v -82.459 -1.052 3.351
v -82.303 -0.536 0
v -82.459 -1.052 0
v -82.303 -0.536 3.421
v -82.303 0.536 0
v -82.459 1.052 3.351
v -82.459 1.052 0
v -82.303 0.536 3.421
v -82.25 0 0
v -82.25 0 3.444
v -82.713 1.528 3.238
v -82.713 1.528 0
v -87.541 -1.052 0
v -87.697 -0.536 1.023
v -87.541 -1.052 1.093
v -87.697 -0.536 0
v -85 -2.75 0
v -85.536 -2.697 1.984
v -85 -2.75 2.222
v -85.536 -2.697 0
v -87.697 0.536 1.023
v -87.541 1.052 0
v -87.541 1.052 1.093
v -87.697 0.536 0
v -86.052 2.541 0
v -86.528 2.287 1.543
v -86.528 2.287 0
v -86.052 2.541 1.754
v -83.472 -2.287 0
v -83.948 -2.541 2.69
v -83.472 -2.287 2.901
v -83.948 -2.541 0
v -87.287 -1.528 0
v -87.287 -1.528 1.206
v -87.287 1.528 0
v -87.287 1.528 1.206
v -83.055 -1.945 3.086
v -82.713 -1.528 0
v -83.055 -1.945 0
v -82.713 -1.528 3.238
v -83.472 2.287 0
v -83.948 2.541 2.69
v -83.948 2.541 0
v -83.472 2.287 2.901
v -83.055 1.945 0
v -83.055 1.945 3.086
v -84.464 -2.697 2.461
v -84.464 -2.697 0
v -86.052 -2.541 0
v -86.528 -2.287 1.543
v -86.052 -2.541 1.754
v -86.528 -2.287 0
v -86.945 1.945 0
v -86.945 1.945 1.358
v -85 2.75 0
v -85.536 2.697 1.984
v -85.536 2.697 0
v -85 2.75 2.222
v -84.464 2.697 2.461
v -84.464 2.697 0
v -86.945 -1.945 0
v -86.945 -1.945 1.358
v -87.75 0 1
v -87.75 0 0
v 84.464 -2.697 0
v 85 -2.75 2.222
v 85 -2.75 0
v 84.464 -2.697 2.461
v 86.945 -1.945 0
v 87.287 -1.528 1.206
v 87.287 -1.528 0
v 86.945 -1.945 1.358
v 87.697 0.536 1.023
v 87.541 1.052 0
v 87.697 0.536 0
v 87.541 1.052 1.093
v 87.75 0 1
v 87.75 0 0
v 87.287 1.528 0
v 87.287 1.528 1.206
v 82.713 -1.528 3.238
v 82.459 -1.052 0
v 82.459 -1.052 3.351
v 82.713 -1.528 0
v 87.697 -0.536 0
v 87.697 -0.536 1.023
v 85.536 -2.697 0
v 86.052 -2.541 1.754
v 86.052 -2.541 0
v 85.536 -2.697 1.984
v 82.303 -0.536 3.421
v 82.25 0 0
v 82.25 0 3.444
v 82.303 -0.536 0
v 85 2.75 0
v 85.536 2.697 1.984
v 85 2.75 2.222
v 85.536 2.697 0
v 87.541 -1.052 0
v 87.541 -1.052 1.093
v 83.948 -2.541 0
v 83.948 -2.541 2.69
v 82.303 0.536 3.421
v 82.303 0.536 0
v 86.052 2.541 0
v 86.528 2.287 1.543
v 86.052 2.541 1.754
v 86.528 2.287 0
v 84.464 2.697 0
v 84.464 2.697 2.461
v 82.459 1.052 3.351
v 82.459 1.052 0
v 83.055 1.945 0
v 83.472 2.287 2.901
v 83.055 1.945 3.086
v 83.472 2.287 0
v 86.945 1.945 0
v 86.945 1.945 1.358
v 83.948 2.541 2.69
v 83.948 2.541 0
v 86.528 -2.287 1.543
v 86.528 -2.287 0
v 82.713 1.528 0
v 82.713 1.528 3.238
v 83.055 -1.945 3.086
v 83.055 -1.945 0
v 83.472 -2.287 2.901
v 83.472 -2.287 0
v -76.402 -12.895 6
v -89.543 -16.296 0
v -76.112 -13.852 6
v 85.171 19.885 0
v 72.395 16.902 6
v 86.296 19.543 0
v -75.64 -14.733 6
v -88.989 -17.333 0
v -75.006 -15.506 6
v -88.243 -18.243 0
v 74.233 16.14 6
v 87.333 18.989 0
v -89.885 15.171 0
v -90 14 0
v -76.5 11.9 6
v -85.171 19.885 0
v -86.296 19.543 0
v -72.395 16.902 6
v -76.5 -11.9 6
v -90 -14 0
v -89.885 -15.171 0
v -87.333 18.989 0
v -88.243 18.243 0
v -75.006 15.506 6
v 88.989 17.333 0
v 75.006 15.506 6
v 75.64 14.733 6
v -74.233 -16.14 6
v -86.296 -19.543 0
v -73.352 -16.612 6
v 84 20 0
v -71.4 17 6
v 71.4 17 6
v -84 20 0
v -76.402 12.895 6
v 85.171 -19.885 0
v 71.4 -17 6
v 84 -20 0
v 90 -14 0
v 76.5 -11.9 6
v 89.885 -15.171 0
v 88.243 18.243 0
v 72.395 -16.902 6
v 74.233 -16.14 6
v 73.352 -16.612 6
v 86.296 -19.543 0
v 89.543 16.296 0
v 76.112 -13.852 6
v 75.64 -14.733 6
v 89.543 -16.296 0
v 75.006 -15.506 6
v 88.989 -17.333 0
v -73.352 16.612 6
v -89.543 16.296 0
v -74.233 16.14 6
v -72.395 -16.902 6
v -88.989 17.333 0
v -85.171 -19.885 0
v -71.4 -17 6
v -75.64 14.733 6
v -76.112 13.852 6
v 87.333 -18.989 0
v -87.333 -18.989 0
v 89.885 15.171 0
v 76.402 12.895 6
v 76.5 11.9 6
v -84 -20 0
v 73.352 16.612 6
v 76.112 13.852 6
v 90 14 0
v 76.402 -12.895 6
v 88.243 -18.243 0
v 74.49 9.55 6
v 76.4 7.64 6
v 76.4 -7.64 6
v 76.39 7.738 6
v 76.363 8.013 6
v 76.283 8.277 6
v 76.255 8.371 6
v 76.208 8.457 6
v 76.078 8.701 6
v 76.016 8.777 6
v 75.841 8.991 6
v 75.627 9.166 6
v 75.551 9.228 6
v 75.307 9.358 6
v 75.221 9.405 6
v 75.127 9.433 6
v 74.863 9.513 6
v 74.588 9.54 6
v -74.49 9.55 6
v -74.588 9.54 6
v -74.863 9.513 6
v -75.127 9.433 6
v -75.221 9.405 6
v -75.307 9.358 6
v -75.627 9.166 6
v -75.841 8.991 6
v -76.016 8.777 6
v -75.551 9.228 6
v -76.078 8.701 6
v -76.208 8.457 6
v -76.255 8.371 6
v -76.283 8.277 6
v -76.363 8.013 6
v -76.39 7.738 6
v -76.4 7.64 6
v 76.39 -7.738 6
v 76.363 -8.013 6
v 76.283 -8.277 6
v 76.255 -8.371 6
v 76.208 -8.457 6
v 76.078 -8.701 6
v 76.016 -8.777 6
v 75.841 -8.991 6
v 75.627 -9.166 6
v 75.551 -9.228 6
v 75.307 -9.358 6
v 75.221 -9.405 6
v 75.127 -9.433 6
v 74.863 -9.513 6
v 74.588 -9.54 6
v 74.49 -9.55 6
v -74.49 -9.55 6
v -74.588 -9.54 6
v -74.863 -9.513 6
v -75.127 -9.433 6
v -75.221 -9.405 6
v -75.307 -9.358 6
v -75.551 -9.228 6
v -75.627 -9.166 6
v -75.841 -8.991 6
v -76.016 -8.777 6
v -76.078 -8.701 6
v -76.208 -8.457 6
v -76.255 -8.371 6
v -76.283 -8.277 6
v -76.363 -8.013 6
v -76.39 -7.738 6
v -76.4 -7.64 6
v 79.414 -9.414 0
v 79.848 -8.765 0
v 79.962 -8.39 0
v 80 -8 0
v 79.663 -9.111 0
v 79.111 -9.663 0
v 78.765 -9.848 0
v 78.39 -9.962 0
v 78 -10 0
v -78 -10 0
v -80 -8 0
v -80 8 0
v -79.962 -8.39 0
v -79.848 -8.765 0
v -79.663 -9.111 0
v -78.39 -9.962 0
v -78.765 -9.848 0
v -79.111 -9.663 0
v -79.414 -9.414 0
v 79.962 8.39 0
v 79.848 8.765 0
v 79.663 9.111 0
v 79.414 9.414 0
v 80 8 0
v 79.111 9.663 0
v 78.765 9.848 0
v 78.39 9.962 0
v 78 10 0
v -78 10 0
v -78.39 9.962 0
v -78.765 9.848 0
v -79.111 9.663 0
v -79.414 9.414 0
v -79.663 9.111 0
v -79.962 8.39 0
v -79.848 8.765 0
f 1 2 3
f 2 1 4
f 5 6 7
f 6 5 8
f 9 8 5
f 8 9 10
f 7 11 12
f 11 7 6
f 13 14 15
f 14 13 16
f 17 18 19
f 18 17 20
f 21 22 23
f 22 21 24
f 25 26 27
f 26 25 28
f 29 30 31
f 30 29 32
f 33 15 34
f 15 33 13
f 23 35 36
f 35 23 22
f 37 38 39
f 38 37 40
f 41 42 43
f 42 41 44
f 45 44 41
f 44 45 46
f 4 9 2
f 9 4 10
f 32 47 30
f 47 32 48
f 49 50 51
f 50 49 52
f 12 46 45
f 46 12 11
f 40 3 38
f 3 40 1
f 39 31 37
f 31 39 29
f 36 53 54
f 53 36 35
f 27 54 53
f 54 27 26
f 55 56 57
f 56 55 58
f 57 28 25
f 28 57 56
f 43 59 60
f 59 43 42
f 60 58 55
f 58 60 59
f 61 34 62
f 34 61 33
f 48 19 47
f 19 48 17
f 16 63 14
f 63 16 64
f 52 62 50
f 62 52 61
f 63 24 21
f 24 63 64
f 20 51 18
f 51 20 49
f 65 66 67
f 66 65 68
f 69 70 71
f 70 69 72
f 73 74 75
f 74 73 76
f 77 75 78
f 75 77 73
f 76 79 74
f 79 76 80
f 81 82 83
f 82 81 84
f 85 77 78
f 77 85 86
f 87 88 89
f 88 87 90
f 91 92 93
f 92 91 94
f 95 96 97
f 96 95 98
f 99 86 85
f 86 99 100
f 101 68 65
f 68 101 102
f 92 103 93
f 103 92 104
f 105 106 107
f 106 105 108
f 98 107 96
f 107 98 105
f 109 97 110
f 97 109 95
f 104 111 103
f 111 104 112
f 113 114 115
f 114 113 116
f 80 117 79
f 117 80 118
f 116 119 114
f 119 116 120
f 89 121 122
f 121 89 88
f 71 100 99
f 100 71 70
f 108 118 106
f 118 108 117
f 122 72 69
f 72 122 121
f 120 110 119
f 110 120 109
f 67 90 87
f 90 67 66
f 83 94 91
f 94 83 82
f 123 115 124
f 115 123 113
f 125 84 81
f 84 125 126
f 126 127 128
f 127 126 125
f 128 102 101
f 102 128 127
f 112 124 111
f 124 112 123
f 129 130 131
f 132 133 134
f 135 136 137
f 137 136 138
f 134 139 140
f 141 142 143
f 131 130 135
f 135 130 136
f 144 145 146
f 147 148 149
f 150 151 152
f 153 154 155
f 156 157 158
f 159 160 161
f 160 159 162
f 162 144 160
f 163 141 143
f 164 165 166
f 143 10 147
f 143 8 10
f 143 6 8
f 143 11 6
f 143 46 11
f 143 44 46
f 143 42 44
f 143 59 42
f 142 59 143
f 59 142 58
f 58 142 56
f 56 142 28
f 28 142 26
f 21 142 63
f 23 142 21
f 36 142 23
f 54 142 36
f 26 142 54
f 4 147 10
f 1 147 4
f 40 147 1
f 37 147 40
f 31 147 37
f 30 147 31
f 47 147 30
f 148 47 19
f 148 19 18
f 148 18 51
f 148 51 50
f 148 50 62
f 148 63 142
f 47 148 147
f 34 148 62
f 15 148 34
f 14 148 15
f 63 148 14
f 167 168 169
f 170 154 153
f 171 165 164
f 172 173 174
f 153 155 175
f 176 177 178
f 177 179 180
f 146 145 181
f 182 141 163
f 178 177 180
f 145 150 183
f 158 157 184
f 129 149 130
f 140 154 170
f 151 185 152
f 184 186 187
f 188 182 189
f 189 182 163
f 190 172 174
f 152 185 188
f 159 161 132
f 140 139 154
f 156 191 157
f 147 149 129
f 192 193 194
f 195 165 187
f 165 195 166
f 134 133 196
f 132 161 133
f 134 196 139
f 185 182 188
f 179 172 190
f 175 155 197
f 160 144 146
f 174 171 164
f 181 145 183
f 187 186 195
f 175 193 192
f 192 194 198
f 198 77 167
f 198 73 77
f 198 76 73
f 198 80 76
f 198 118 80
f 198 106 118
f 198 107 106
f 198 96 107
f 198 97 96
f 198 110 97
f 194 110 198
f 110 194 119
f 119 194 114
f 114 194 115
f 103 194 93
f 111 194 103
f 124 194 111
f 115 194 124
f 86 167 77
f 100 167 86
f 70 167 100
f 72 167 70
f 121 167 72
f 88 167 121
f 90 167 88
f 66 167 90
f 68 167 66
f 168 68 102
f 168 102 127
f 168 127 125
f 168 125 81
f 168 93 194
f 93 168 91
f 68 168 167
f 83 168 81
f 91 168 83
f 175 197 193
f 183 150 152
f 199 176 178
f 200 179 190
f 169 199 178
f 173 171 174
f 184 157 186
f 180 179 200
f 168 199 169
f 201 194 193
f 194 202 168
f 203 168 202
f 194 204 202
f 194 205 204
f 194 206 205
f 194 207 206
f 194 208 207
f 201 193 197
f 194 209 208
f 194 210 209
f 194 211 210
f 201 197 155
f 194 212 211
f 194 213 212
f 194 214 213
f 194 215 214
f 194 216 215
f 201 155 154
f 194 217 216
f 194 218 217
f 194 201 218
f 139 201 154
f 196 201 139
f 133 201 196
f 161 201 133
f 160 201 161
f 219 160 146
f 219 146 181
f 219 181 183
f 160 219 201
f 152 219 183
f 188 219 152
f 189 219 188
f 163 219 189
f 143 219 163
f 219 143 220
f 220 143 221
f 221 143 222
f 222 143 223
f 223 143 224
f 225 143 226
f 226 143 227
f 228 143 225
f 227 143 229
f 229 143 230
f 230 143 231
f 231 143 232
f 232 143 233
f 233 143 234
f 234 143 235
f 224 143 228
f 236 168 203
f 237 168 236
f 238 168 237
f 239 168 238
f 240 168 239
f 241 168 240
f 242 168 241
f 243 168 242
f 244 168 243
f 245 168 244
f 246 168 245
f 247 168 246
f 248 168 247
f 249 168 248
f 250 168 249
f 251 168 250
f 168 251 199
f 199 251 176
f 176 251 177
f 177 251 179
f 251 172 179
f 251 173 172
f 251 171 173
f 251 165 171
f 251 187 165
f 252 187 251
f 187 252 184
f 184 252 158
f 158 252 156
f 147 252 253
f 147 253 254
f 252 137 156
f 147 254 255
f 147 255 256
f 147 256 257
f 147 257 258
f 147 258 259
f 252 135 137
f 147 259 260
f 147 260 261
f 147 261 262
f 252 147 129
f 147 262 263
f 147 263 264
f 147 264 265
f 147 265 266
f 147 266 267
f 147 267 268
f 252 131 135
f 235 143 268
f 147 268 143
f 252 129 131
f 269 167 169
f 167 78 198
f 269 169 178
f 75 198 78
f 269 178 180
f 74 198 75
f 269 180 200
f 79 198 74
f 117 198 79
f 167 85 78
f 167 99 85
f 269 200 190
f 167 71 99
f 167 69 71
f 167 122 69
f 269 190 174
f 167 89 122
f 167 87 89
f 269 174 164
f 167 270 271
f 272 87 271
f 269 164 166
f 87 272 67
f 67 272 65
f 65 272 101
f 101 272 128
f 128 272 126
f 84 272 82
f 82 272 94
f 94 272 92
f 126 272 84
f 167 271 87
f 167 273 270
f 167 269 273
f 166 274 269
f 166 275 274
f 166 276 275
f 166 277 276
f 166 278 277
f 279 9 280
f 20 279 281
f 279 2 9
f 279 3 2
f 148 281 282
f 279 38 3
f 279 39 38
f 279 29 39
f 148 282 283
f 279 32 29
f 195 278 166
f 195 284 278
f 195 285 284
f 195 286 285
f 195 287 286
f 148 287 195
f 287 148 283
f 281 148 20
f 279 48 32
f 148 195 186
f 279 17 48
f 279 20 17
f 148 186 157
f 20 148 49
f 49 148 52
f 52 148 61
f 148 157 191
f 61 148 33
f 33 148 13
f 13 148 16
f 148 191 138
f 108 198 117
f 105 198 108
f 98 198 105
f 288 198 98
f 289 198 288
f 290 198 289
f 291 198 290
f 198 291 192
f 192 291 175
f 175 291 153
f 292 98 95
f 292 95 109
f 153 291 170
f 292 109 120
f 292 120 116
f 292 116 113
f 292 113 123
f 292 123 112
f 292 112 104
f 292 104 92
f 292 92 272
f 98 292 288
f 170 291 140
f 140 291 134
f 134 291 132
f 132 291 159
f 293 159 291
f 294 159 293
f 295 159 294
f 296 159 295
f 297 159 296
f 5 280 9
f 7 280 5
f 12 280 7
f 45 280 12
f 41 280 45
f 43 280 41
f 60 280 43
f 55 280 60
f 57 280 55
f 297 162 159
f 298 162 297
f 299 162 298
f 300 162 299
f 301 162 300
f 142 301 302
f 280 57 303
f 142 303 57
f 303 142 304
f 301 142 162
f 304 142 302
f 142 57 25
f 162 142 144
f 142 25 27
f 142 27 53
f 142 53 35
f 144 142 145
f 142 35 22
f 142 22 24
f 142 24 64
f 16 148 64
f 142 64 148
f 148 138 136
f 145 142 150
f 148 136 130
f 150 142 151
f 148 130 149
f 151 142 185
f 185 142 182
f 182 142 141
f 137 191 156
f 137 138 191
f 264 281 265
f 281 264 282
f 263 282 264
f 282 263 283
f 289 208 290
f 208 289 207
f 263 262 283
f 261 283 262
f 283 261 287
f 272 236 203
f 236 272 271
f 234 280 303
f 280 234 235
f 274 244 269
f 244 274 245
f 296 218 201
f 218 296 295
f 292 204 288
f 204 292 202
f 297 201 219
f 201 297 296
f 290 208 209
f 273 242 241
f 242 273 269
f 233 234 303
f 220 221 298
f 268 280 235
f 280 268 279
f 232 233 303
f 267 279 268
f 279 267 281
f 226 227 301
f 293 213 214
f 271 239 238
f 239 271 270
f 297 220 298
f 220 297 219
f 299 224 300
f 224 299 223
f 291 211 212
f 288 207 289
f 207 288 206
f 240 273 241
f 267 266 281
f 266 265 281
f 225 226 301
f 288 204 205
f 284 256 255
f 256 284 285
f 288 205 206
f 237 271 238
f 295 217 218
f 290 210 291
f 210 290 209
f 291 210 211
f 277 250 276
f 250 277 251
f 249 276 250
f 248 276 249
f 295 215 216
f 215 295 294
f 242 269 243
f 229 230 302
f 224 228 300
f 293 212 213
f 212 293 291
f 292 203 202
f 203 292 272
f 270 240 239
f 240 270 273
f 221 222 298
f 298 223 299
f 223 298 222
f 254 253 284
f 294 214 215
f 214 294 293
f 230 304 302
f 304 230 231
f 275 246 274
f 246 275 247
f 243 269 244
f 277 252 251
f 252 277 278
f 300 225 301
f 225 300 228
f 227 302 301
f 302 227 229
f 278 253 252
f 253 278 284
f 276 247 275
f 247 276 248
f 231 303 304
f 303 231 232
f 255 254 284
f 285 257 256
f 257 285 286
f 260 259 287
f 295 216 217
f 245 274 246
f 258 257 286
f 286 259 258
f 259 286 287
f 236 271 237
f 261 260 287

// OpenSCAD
$fn = 32;

// ----------------------------------------------------------------------
// Display bezel: 180 x 40 mm frame, opening 160x20 mm
// ----------------------------------------------------------------------

// --- parameters (mm) ---
length = 180;             // frame outside length, X
width = 40;               // frame outside width, Y
frame_w = 10;             // frame width
thickness = 6;            // frame thickness
corner_r = 6;             // outside corner radius
chamfer = 0.85;           // outer wall taper
funnel = 0.94;            // inner opening taper
opening_l = 160;          // opening length
opening_w = 20;           // opening width
inner_r = 2;              // opening corner radius
hole_d = 5.5;             // mounting screw clearance
holes_per_side = 1;       // holes per short side
hole_inset = 5;           // hole centre inset from the outside edge

/* rounded-rectangle outlines, generated with loops */
module rounded_ring(l_nom, w_nom, r) {
  hull() {
    for (sx = [-1, 1]) for (sy = [-1, 1])
      translate([sx * (l_nom / 2 - r), sy * (w_nom / 2 - r)]) circle(r = r);
  }
}

difference() {
  /* frame body, drafted so the outer edge is a variable-depth chamfer */
  linear_extrude(height = thickness, scale = chamfer)
    rounded_ring(length, width, corner_r);
  /* viewing opening, drafted the other way for a funnel edge */
  linear_extrude(height = thickness + 2, scale = funnel)
    translate([0, 0, -1]) rounded_ring(opening_l, opening_w, inner_r);
  /* mounting screws through the frame lands */
  for (sx = [-1, 1]) for (i = [1 : holes_per_side])
    translate([sx * (length / 2 - hole_inset),
               (i - (holes_per_side + 1) / 2) * width * 0.5, -1])
      cylinder(h = thickness + 2, d = hole_d);
}
